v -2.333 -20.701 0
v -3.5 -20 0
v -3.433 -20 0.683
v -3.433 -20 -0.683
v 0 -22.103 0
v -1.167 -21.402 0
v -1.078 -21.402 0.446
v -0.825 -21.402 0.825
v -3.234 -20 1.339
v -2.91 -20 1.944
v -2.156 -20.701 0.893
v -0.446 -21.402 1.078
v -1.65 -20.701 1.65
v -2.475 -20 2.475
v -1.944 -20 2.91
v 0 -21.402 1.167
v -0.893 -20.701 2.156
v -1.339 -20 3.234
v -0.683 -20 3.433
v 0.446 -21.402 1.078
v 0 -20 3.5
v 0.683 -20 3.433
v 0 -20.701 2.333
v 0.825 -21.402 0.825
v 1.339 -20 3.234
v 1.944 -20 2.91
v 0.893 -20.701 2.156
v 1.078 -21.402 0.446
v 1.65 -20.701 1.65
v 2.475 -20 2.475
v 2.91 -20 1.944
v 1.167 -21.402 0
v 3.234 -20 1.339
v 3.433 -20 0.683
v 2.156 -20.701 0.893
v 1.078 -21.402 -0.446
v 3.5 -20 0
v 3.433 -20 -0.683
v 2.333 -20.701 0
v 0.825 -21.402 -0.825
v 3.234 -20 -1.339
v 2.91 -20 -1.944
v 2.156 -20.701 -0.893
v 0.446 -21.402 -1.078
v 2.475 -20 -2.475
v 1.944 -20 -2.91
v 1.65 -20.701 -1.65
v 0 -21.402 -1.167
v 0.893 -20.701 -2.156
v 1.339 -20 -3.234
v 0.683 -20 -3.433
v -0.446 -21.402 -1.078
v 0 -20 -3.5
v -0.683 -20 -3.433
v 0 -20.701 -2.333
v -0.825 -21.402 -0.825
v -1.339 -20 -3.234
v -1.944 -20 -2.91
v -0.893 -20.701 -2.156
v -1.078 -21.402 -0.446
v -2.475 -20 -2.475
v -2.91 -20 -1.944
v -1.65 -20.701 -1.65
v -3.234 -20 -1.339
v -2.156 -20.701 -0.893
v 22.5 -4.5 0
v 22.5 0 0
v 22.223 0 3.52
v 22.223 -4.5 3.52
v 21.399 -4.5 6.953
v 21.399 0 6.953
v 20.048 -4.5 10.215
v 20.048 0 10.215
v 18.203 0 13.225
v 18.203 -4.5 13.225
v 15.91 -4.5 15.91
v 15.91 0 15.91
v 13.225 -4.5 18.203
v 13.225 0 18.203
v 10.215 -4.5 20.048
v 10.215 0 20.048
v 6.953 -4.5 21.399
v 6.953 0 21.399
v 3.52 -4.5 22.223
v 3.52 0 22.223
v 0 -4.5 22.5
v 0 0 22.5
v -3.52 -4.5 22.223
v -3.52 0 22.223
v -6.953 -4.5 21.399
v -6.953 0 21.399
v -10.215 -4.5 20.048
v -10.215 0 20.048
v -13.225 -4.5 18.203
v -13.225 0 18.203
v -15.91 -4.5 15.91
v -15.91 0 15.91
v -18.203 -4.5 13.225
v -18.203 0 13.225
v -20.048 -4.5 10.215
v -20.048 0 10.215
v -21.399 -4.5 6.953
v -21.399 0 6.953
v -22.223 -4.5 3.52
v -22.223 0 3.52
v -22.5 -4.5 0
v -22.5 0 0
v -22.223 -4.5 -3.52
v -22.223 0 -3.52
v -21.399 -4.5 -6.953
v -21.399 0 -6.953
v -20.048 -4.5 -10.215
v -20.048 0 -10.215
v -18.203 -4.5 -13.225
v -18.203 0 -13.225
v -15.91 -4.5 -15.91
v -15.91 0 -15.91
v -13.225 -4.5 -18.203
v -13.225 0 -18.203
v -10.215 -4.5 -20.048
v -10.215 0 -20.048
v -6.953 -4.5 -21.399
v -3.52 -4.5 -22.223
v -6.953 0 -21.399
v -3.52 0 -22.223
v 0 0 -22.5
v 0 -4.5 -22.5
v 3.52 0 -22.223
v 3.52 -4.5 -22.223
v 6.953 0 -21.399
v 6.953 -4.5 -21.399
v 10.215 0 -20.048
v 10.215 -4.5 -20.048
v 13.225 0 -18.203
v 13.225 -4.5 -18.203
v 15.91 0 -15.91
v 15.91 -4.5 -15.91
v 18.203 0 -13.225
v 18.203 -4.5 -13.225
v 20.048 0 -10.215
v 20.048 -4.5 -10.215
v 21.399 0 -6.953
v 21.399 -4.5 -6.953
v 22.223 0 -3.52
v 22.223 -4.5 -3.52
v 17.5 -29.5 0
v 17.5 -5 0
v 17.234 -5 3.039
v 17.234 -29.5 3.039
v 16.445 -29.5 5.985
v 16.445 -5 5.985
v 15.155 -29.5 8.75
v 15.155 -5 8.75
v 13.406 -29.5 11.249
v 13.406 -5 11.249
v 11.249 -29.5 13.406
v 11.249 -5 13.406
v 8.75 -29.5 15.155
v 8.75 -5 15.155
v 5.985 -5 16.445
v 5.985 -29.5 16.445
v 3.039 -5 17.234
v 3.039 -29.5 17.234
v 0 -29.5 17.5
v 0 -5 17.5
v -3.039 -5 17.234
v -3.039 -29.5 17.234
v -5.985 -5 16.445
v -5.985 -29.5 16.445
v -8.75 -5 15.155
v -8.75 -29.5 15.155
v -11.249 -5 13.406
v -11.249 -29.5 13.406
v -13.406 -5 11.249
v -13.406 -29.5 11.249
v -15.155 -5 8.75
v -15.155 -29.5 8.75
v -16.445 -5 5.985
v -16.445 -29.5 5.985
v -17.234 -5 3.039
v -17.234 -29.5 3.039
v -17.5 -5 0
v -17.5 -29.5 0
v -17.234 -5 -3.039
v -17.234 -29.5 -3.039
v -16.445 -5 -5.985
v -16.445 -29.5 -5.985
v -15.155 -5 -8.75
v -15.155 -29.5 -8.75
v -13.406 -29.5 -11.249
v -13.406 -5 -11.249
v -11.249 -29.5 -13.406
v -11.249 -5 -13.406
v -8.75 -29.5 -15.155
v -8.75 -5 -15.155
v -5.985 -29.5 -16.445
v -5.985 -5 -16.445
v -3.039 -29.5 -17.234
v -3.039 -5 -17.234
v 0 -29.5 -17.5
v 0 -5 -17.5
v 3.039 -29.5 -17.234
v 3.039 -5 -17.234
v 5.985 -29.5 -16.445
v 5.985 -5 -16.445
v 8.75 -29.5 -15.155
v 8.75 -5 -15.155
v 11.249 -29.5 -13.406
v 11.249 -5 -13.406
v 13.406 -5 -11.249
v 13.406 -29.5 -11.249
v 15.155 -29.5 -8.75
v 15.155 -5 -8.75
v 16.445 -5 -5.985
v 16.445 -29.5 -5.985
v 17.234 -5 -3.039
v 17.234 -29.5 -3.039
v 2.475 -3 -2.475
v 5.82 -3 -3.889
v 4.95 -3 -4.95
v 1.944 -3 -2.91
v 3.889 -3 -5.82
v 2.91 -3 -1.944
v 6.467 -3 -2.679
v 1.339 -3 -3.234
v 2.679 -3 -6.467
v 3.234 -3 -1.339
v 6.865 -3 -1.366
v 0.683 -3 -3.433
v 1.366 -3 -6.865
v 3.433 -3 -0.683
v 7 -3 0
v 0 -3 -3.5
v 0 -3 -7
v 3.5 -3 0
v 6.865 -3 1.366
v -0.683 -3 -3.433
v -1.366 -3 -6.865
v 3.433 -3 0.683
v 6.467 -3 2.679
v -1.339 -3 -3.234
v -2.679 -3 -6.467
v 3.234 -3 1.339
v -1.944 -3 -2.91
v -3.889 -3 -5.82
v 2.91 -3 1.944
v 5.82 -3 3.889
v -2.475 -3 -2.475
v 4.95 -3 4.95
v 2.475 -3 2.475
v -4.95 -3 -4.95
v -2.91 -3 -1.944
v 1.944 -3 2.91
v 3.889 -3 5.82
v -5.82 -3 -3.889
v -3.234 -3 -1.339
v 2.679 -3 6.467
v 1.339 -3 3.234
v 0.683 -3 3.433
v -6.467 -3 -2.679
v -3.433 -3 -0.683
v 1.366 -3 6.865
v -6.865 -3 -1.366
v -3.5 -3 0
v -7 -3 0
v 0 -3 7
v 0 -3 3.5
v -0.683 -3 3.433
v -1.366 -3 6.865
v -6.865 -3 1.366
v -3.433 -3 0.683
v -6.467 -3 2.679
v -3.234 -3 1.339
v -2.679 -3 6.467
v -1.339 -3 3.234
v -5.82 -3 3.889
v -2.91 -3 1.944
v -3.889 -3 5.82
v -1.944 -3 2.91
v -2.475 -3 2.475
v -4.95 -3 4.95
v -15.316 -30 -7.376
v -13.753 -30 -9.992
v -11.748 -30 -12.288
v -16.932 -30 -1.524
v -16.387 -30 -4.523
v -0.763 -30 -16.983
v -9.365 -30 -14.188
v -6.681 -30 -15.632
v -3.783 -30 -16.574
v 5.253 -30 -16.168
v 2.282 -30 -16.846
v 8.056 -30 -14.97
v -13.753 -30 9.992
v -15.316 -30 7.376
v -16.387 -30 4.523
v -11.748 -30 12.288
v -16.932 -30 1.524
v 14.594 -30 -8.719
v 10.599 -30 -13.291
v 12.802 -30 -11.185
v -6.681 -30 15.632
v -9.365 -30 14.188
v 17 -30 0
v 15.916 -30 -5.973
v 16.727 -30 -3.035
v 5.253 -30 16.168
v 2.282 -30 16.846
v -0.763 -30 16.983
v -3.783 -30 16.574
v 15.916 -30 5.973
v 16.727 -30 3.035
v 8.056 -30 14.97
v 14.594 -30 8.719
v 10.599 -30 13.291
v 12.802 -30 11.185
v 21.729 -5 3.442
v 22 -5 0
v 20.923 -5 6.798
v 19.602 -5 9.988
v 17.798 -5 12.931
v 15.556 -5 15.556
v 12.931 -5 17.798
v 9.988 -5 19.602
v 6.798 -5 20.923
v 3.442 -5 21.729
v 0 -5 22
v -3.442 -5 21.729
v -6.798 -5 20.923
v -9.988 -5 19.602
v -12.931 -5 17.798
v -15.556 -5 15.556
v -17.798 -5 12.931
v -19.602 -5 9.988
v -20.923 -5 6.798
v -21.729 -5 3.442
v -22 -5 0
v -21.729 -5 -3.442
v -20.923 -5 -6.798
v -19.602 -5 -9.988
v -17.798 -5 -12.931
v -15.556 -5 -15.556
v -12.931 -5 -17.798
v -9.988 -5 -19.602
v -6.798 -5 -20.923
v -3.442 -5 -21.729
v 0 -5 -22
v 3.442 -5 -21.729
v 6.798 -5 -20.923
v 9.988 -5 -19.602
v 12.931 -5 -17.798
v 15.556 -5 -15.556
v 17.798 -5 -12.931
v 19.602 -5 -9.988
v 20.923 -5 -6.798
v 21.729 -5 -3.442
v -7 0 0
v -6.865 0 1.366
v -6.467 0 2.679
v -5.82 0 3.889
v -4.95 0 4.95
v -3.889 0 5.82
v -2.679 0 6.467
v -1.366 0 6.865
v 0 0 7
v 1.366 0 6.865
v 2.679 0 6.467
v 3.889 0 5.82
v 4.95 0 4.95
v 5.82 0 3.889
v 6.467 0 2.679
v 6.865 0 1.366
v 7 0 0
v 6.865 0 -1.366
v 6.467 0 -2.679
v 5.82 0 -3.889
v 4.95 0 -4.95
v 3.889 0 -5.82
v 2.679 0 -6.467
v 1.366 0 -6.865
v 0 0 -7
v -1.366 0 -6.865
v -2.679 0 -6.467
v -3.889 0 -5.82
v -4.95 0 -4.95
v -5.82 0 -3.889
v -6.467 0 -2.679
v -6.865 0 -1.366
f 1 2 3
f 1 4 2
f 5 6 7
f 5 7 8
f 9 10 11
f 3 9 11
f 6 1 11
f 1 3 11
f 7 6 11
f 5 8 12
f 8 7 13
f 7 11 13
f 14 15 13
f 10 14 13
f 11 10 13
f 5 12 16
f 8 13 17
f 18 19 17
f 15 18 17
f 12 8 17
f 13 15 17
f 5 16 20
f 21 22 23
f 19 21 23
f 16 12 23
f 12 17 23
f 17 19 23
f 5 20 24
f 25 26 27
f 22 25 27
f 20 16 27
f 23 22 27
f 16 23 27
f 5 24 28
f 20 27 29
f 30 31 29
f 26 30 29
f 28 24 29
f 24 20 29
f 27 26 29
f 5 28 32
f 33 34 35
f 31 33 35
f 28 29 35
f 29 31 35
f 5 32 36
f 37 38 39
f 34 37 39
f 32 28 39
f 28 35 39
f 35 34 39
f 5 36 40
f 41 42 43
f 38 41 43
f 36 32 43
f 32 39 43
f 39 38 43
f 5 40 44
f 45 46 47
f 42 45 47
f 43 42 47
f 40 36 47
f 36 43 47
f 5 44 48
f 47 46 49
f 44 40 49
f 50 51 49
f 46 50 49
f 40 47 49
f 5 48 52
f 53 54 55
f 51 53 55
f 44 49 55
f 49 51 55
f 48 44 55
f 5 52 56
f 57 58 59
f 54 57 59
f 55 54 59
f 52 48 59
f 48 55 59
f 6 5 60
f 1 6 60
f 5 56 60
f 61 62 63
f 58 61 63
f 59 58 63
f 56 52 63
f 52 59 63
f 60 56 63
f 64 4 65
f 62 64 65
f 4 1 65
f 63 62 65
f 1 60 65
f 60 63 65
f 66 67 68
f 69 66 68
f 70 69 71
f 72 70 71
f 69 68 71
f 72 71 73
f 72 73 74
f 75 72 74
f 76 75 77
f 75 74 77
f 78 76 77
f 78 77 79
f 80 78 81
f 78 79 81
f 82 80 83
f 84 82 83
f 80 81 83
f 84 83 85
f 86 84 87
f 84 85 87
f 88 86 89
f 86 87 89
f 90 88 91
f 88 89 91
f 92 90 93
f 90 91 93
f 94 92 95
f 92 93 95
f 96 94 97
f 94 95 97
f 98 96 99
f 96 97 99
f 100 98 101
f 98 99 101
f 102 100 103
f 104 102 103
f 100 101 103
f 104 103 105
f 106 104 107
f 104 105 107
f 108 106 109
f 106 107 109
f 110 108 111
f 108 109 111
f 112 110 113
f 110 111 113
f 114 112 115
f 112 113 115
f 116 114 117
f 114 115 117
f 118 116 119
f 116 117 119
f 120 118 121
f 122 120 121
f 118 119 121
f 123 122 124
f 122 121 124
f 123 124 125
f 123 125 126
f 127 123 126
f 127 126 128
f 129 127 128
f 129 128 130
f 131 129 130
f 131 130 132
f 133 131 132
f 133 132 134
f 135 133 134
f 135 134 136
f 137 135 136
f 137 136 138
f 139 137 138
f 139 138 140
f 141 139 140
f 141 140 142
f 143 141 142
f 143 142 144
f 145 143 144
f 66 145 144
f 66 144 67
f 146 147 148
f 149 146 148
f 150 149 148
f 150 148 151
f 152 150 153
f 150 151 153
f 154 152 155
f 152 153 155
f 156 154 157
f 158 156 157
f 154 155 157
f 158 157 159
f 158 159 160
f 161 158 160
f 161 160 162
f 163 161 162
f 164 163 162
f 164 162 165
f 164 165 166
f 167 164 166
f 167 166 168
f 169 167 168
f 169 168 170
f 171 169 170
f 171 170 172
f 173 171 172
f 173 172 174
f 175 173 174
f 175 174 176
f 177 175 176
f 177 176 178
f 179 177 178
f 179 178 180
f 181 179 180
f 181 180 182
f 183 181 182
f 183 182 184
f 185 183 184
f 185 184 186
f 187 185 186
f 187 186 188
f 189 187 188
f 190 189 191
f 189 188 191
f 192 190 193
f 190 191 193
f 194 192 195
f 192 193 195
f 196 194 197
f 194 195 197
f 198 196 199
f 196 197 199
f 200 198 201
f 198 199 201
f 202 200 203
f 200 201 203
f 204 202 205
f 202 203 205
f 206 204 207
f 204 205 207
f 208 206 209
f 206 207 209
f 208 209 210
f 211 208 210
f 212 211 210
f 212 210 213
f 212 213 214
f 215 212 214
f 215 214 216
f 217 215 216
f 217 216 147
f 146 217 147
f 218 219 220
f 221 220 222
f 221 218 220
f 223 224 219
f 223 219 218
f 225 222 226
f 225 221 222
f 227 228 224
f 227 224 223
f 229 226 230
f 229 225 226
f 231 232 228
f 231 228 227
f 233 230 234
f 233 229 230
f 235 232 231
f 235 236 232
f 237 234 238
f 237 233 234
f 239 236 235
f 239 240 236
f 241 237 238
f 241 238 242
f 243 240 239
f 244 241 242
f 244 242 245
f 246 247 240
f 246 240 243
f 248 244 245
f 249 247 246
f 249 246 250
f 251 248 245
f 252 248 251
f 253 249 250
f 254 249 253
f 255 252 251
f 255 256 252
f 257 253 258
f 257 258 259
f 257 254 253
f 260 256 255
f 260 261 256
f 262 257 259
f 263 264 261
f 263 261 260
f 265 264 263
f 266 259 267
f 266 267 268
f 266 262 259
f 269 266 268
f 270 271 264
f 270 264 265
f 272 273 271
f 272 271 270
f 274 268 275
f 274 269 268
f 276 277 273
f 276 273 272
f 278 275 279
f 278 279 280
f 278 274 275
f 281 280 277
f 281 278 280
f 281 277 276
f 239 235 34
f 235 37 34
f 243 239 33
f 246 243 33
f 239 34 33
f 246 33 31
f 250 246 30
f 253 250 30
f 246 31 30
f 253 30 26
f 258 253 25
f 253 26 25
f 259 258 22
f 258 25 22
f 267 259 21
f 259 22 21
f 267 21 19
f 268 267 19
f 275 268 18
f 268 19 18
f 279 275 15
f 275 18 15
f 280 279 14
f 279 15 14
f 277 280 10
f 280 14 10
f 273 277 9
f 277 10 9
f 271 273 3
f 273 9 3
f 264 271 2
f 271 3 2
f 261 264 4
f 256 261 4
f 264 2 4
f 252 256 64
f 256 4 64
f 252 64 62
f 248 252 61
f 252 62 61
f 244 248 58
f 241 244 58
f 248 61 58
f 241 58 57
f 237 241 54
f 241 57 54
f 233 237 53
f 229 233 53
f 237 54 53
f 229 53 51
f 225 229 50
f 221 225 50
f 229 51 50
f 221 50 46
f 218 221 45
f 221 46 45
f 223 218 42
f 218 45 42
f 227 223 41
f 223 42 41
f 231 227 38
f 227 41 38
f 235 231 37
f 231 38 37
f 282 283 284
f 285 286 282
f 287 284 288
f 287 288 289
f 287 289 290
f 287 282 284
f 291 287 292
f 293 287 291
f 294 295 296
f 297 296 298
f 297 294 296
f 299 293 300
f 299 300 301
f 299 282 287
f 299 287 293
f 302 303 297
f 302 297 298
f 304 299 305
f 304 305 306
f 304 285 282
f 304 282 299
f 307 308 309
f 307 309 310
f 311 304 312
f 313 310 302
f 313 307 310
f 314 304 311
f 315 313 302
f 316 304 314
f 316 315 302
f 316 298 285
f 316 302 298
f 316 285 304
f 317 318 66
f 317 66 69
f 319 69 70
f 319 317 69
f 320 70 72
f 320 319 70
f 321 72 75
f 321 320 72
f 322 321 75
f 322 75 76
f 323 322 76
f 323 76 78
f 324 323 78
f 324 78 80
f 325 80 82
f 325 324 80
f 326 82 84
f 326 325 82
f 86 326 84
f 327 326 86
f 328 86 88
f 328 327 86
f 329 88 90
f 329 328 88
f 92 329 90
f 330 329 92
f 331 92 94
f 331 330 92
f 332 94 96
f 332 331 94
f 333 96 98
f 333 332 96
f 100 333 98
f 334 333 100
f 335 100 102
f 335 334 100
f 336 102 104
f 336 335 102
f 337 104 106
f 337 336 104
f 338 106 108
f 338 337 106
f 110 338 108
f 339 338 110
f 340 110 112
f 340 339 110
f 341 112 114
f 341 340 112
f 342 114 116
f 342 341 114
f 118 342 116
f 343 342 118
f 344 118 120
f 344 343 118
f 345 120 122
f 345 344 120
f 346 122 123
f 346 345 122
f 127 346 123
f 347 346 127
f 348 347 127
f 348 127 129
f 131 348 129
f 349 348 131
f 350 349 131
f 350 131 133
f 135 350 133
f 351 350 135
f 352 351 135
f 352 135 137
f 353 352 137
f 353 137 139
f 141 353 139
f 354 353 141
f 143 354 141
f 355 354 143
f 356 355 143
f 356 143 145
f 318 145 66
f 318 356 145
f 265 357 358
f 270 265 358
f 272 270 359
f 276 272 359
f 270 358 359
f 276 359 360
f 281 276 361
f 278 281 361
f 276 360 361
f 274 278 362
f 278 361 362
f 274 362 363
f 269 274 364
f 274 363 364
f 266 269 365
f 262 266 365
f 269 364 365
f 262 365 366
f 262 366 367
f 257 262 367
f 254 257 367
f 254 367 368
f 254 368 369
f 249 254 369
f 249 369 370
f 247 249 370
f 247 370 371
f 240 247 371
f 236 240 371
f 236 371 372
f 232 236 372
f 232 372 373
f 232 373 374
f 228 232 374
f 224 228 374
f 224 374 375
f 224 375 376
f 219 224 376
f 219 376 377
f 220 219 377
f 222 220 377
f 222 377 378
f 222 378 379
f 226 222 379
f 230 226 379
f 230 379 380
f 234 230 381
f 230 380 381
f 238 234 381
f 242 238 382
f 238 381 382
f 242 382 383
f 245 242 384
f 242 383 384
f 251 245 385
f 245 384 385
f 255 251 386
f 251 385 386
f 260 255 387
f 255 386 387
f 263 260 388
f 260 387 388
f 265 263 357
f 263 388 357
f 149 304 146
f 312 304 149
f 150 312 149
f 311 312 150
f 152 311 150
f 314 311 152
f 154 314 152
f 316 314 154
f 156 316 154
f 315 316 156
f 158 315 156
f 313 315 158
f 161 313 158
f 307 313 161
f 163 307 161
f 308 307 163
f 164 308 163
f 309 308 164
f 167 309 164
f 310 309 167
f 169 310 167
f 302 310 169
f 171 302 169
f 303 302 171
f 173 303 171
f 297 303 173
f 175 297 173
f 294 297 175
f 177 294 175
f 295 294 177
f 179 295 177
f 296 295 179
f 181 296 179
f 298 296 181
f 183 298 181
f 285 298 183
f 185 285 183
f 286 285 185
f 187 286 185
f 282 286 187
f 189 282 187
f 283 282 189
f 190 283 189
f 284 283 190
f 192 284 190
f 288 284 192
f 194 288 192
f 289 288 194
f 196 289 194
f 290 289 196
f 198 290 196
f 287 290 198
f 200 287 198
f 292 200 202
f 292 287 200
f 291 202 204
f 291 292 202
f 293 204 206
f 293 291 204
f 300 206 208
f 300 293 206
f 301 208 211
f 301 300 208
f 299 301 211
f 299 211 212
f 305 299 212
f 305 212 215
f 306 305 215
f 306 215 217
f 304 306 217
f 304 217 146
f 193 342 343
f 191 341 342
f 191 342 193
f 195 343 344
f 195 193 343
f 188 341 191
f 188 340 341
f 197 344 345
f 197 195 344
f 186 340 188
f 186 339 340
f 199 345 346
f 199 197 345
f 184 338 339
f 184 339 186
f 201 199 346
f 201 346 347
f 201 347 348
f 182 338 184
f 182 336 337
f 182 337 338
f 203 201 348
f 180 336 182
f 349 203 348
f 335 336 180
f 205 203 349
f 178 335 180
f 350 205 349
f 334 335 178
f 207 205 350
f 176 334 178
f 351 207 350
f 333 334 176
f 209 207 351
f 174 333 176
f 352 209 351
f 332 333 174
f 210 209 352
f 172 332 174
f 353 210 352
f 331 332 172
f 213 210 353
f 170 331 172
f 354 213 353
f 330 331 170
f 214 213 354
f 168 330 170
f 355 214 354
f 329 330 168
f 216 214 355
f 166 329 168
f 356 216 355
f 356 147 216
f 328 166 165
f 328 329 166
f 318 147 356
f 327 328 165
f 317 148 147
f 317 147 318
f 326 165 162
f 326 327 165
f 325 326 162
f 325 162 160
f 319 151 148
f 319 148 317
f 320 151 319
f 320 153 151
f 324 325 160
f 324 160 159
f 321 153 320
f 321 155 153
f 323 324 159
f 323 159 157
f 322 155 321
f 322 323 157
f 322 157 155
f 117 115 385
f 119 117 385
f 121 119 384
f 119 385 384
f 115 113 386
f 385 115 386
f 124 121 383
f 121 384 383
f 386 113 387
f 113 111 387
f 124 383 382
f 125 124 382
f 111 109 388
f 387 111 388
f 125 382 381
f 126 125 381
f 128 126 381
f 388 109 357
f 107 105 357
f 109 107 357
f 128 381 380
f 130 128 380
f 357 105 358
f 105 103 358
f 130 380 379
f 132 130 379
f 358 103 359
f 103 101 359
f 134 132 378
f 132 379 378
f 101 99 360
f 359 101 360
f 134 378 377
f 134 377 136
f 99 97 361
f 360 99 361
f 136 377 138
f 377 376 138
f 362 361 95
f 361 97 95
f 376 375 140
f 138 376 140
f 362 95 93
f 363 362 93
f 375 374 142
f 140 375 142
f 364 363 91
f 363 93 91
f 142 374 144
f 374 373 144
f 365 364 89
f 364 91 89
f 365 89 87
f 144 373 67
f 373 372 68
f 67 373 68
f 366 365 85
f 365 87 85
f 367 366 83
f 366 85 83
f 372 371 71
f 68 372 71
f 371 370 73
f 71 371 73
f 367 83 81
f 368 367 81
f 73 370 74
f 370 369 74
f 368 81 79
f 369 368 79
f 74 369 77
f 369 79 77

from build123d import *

# Parameters (mm, degrees)
F0_R           = 17.5
F1_DEPTH       = 30
F0_R_2         = 22.5
F2_DEPTH       = 5
F4_D           = 7
F4_DEPTH       = 20
F4_CBORE_D     = 14
F4_CBORE_DEPTH = 3
F4_TIP         = 2.1030121666
F5_SIZE        = 0.5


with BuildPart() as f1:
    # F0 (on Front) → F1 (new body)
    with BuildSketch(Plane.XZ):
        Circle(F0_R)
    extrude(amount=F1_DEPTH)

    # F0 (on Front) → F2 (join)
    with BuildSketch(Plane.XZ):
        Circle(F0_R_2)
        Circle(F0_R, mode=Mode.SUBTRACT)
    extrude(amount=F2_DEPTH)

    # F4
    with Locations(Plane(origin=(0, 0, 0), x_dir=(-1, 0, 0), z_dir=(0, 1, 0))):
        with Locations((0, 0)):
            CounterBoreHole(F4_D / 2, F4_CBORE_D / 2, F4_CBORE_DEPTH, depth=F4_DEPTH)
            with Locations((0, 0, -(F4_DEPTH + F4_TIP / 2))):  # 118° drill point
                Cone(0, F4_D / 2, F4_TIP, mode=Mode.SUBTRACT)

    # F5
    f5_edges = [f1.edges().sort_by_distance(p)[0] for p in [
        (-17.5, -30, 0),
        (-22.5, -5, 0),
    ]]
    chamfer(f5_edges, length=F5_SIZE)


solid = f1.part
